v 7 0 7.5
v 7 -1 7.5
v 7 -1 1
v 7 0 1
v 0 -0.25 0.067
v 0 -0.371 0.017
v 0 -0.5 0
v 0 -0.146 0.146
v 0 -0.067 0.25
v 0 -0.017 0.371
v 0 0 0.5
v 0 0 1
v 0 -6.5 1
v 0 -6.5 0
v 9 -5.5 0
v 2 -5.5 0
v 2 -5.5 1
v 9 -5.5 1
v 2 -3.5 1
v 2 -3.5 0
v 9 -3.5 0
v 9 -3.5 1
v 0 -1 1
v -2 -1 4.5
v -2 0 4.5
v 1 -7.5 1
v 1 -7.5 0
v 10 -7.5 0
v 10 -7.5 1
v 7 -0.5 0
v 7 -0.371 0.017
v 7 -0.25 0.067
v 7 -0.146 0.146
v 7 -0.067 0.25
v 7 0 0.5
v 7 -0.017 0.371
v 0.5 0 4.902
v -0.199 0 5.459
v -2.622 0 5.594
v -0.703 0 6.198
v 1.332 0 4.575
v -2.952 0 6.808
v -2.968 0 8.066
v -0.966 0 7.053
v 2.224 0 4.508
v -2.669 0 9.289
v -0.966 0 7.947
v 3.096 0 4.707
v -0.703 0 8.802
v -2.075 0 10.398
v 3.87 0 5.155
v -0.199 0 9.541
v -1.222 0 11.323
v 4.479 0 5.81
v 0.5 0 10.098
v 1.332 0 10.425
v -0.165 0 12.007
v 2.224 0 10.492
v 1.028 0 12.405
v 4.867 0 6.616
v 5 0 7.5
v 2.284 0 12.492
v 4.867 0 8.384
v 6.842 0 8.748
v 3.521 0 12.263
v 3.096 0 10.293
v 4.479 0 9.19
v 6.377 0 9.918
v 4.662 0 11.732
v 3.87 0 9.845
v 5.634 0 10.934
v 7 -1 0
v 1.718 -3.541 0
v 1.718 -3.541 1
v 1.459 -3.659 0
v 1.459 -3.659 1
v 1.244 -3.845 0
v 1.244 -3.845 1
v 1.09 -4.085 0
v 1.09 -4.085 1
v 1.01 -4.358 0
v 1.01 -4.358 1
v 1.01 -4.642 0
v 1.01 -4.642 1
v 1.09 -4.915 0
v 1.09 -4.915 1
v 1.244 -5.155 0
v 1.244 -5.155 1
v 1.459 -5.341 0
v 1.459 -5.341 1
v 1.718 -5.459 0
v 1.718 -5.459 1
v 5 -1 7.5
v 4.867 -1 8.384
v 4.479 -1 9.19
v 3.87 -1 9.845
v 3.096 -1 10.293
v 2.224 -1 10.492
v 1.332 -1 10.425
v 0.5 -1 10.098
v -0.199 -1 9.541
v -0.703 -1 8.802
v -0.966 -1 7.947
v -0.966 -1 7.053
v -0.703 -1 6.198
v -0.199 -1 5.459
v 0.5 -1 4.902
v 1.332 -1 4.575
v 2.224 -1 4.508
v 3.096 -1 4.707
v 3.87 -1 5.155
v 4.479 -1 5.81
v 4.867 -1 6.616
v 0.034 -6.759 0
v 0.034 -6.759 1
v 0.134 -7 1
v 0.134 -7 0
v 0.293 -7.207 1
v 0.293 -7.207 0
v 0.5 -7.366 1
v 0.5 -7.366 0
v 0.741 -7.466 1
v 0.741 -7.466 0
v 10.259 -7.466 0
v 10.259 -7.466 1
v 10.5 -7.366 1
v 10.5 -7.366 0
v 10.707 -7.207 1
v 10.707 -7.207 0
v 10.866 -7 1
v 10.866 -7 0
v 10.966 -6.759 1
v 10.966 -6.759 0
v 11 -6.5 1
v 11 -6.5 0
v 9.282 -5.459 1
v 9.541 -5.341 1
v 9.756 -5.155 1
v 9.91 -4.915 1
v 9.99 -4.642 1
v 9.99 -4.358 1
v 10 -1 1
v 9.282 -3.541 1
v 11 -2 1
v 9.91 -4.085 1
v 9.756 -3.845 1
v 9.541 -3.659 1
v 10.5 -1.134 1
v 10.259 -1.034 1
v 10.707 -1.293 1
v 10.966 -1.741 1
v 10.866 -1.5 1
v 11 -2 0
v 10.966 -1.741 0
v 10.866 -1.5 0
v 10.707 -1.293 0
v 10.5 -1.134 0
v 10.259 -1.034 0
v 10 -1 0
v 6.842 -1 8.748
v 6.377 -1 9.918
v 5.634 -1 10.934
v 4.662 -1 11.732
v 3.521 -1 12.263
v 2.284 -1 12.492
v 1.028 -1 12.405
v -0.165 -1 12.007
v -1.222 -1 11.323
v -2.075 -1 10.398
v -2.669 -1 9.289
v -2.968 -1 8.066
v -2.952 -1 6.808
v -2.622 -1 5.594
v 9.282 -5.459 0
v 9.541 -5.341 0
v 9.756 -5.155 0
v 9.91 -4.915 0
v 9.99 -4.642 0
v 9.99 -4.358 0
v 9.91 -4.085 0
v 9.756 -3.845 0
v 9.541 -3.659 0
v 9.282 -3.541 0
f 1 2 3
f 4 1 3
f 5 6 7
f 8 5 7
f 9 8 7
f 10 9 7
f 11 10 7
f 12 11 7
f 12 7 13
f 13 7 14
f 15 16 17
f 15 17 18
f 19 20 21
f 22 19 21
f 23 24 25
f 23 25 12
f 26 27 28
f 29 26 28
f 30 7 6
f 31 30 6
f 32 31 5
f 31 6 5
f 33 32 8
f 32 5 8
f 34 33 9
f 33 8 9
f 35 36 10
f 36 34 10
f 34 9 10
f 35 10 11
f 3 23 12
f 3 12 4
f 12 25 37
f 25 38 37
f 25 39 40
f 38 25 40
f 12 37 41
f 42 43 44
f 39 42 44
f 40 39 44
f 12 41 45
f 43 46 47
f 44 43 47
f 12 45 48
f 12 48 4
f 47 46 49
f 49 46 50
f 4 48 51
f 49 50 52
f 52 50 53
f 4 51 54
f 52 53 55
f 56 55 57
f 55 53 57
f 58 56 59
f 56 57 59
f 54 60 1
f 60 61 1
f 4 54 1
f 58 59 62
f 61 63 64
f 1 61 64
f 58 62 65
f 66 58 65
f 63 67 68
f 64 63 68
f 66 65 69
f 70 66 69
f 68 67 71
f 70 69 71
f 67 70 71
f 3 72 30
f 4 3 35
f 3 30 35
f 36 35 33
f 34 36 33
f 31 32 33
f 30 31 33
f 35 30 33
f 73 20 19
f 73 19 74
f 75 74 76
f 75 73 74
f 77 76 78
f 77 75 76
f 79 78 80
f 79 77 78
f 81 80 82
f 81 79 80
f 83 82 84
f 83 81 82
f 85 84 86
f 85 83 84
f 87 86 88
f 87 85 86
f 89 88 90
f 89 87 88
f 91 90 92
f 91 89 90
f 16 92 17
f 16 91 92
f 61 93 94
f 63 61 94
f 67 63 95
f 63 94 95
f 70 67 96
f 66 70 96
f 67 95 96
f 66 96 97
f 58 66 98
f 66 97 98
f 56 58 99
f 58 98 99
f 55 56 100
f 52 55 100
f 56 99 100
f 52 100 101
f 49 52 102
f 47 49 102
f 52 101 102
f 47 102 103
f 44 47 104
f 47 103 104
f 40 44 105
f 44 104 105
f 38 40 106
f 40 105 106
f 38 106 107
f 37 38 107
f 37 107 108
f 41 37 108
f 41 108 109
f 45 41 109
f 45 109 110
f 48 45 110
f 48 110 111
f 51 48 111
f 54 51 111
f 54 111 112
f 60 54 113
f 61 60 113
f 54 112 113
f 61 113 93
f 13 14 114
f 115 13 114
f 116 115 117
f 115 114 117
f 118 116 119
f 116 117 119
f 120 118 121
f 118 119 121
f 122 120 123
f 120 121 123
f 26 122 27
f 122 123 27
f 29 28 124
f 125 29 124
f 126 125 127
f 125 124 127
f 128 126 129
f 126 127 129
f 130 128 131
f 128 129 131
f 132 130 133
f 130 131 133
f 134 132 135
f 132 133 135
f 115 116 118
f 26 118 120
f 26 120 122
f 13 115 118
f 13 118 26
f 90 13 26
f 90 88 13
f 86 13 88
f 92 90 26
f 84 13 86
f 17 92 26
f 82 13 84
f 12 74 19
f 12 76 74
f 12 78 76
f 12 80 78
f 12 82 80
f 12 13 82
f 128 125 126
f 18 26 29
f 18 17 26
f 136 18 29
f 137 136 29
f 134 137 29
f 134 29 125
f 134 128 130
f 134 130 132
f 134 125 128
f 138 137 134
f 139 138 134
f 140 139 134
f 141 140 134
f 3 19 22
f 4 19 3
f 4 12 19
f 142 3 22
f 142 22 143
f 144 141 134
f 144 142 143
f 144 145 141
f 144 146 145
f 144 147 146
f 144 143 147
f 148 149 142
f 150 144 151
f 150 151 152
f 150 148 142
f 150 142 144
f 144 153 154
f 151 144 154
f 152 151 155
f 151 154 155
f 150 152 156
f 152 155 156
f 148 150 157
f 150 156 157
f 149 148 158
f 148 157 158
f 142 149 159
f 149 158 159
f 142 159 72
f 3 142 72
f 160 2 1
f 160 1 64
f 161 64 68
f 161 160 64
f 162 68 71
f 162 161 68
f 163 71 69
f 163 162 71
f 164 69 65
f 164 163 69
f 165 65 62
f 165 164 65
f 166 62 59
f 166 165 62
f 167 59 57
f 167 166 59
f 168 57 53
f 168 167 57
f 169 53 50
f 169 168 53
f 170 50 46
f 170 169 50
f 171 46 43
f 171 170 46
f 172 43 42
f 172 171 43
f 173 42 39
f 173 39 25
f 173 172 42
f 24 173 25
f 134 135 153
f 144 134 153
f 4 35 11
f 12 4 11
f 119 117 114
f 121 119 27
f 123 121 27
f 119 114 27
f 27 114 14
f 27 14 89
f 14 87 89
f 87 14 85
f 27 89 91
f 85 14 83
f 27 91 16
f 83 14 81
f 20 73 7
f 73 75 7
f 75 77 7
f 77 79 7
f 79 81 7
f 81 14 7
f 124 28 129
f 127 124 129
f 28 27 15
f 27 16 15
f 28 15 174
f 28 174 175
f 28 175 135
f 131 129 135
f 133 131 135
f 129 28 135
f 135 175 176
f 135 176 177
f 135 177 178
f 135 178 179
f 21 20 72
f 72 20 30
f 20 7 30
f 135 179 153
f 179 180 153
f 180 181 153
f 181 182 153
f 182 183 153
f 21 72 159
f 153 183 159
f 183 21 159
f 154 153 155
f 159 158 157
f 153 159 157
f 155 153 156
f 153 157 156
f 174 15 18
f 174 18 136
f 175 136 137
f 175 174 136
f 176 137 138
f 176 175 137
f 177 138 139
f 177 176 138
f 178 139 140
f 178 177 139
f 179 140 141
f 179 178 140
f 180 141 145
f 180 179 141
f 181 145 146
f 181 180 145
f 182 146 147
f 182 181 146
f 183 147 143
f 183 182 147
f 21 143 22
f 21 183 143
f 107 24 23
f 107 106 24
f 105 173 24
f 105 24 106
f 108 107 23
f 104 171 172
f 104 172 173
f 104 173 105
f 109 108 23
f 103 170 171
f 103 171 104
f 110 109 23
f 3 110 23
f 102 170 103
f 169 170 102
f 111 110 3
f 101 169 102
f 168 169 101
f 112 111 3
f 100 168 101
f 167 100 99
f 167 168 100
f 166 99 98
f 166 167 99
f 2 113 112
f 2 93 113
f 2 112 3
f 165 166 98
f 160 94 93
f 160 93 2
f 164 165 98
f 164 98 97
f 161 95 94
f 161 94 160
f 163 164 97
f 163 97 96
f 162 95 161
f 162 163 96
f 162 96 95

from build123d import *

# Parameters (mm, degrees)
EXTRUDE001_DEPTH                     = 1
EXTRUDE002_DEPTH                     = 15
EXTRUDE_DEPTH                        = 1
SKETCH004_AS_DRAWN_R                 = 3
EXTRUDE004_DEPTH                     = 1
EXTRUDE004_ONTO_SKETCH004_ROLL_ANGLE = 90
EXTRUDE003_DEPTH                     = 1
EXTRUDE003_ONTO_SKETCH003_ROLL_ANGLE = 90


with BuildPart() as extrude001:
    # Sketch001 → Extrude001 (new body)
    with BuildSketch(Plane.XY):
        with BuildLine():
            Line((2, -5.5), (9, -5.5))
            ThreePointArc((9, -5.5), (10, -4.5), (9, -3.5))
            Line((2, -3.5), (9, -3.5))
            ThreePointArc((2, -3.5), (1, -4.5), (2, -5.5))
        make_face()
    extrude(amount=EXTRUDE001_DEPTH)


with BuildPart() as extrude002:
    # Sketch002 → Extrude002 (new body)
    with BuildSketch(Plane.YZ):
        with BuildLine():
            ThreePointArc((-0.5, 0), (-0.146447, 0.146447), (0, 0.5))
            Line((0, 0.5), (0, 0))
            Line((-0.5, 0), (0, 0))
        make_face()
    extrude(amount=EXTRUDE002_DEPTH)


with BuildPart() as cut001:
    # Sketch → Extrude (new body)
    with BuildSketch(Plane(origin=(0, -0.5, 0), x_dir=(1, 0, 0), z_dir=(0, 0, 1))):
        with BuildLine():
            ThreePointArc((0, -6), (0.292893, -6.707107), (1, -7))
            Line((1, -7), (10, -7))
            ThreePointArc((10, -7), (10.707107, -6.707106), (11, -6))
            Line((11, -6), (11, -1.5))
            ThreePointArc((11, -1.5), (10.707107, -0.792893), (10, -0.5))
            Line((10, -0.5), (7, -0.5))
            Line((7, -0.5), (7, 0.5))
            Line((7, 0.5), (0, 0.5))
            Line((0, 0.5), (0, -6))
        make_face()
    extrude(amount=EXTRUDE_DEPTH)

    # Cut: cut Extrude002
    add(extrude002.part, mode=Mode.SUBTRACT)

    # Cut001: cut Extrude001
    add(extrude001.part, mode=Mode.SUBTRACT)


with BuildPart() as extrude004:
    # Sketch004 as drawn → Extrude004 (new)
    with BuildSketch(Plane.XY):
        with Locations((2, 8)):
            Circle(SKETCH004_AS_DRAWN_R)
    extrude(amount=-EXTRUDE004_DEPTH)


with BuildPart() as extrude004_1:
    # Extrude004 onto Sketch004 roll: moved
    add(extrude004.part.rotate(Axis((0, 0, 0), (1, 0, 0)), EXTRUDE004_ONTO_SKETCH004_ROLL_ANGLE))


with BuildPart() as extrude004_2:
    # Extrude004 onto Sketch004 placement: moved
    add(extrude004_1.part.moved(Location((0, -1, -0.5))))


with BuildPart() as cut002:
    # Sketch003 as drawn → Extrude003 (new)
    with BuildSketch(Plane.XY):
        with BuildLine():
            ThreePointArc((7, 8), (0.418861, 12.743416), (-1.999999, 5))
            Line((-1.999999, 5), (0, 1.5))
            Line((0, 1.5), (7, 1.5))
            Line((7, 8), (7, 1.5))
        make_face()
    extrude(amount=-EXTRUDE003_DEPTH)


with BuildPart() as cut002_1:
    # Extrude003 onto Sketch003 roll: moved
    add(cut002.part.rotate(Axis((0, 0, 0), (1, 0, 0)), EXTRUDE003_ONTO_SKETCH003_ROLL_ANGLE))


with BuildPart() as cut002_2:
    # Extrude003 onto Sketch003 placement: moved
    add(cut002_1.part.moved(Location((0, -1, -0.5))))

    # Cut002: cut Extrude004
    add(extrude004_2.part, mode=Mode.SUBTRACT)


solid = Compound([cut001.part, cut002_2.part])
